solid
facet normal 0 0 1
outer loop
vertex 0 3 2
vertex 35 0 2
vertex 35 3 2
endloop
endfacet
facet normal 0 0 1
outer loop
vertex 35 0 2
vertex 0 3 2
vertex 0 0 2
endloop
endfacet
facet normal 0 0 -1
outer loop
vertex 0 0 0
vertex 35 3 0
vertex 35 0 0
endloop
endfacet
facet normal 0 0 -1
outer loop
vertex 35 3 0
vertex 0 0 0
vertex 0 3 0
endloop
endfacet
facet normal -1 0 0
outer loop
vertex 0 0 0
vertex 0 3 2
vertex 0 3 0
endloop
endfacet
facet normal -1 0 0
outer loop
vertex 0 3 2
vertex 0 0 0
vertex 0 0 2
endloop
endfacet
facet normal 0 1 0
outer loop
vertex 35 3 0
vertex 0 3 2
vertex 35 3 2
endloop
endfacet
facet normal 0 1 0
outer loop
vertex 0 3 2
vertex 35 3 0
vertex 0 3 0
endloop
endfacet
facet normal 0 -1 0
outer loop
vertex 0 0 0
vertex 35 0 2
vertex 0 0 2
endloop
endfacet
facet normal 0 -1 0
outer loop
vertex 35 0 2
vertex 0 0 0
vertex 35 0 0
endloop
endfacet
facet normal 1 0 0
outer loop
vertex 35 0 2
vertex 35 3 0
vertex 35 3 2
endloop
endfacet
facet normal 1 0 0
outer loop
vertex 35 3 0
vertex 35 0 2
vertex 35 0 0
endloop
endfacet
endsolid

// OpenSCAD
translate([2.5, 1.5, 1.0]) color([0.7314892207908478, 0.11713429320851798, 0.22046053686782852]) cube([5, 3, 2], center=true);
translate([7.5, 1.5, 1.0]) color([0.7945829717105759, 0.33253614921965546, 0.8159130965336595]) cube([5, 3, 2], center=true);
translate([12.5, 1.5, 1.0]) color([0.1006075202160962, 0.14635848891230385, 0.6976706401912388]) cube([5, 3, 2], center=true);
translate([17.5, 1.5, 1.0]) color([0.04523406786561235, 0.5738660367891669, 0.9100160146990397]) cube([5, 3, 2], center=true);
translate([22.5, 1.5, 1.0]) color([0.534197968260724, 0.6805891325622565, 0.026696794662205203]) cube([5, 3, 2], center=true);
translate([27.5, 1.5, 1.0]) color([0.6349999099114583, 0.6063384177542189, 0.5759529480315407]) cube([5, 3, 2], center=true);
translate([32.5, 1.5, 1.0]) color([0.3912094093228269, 0.3701399403351875, 0.9805166506472687]) cube([5, 3, 2], center=true);
